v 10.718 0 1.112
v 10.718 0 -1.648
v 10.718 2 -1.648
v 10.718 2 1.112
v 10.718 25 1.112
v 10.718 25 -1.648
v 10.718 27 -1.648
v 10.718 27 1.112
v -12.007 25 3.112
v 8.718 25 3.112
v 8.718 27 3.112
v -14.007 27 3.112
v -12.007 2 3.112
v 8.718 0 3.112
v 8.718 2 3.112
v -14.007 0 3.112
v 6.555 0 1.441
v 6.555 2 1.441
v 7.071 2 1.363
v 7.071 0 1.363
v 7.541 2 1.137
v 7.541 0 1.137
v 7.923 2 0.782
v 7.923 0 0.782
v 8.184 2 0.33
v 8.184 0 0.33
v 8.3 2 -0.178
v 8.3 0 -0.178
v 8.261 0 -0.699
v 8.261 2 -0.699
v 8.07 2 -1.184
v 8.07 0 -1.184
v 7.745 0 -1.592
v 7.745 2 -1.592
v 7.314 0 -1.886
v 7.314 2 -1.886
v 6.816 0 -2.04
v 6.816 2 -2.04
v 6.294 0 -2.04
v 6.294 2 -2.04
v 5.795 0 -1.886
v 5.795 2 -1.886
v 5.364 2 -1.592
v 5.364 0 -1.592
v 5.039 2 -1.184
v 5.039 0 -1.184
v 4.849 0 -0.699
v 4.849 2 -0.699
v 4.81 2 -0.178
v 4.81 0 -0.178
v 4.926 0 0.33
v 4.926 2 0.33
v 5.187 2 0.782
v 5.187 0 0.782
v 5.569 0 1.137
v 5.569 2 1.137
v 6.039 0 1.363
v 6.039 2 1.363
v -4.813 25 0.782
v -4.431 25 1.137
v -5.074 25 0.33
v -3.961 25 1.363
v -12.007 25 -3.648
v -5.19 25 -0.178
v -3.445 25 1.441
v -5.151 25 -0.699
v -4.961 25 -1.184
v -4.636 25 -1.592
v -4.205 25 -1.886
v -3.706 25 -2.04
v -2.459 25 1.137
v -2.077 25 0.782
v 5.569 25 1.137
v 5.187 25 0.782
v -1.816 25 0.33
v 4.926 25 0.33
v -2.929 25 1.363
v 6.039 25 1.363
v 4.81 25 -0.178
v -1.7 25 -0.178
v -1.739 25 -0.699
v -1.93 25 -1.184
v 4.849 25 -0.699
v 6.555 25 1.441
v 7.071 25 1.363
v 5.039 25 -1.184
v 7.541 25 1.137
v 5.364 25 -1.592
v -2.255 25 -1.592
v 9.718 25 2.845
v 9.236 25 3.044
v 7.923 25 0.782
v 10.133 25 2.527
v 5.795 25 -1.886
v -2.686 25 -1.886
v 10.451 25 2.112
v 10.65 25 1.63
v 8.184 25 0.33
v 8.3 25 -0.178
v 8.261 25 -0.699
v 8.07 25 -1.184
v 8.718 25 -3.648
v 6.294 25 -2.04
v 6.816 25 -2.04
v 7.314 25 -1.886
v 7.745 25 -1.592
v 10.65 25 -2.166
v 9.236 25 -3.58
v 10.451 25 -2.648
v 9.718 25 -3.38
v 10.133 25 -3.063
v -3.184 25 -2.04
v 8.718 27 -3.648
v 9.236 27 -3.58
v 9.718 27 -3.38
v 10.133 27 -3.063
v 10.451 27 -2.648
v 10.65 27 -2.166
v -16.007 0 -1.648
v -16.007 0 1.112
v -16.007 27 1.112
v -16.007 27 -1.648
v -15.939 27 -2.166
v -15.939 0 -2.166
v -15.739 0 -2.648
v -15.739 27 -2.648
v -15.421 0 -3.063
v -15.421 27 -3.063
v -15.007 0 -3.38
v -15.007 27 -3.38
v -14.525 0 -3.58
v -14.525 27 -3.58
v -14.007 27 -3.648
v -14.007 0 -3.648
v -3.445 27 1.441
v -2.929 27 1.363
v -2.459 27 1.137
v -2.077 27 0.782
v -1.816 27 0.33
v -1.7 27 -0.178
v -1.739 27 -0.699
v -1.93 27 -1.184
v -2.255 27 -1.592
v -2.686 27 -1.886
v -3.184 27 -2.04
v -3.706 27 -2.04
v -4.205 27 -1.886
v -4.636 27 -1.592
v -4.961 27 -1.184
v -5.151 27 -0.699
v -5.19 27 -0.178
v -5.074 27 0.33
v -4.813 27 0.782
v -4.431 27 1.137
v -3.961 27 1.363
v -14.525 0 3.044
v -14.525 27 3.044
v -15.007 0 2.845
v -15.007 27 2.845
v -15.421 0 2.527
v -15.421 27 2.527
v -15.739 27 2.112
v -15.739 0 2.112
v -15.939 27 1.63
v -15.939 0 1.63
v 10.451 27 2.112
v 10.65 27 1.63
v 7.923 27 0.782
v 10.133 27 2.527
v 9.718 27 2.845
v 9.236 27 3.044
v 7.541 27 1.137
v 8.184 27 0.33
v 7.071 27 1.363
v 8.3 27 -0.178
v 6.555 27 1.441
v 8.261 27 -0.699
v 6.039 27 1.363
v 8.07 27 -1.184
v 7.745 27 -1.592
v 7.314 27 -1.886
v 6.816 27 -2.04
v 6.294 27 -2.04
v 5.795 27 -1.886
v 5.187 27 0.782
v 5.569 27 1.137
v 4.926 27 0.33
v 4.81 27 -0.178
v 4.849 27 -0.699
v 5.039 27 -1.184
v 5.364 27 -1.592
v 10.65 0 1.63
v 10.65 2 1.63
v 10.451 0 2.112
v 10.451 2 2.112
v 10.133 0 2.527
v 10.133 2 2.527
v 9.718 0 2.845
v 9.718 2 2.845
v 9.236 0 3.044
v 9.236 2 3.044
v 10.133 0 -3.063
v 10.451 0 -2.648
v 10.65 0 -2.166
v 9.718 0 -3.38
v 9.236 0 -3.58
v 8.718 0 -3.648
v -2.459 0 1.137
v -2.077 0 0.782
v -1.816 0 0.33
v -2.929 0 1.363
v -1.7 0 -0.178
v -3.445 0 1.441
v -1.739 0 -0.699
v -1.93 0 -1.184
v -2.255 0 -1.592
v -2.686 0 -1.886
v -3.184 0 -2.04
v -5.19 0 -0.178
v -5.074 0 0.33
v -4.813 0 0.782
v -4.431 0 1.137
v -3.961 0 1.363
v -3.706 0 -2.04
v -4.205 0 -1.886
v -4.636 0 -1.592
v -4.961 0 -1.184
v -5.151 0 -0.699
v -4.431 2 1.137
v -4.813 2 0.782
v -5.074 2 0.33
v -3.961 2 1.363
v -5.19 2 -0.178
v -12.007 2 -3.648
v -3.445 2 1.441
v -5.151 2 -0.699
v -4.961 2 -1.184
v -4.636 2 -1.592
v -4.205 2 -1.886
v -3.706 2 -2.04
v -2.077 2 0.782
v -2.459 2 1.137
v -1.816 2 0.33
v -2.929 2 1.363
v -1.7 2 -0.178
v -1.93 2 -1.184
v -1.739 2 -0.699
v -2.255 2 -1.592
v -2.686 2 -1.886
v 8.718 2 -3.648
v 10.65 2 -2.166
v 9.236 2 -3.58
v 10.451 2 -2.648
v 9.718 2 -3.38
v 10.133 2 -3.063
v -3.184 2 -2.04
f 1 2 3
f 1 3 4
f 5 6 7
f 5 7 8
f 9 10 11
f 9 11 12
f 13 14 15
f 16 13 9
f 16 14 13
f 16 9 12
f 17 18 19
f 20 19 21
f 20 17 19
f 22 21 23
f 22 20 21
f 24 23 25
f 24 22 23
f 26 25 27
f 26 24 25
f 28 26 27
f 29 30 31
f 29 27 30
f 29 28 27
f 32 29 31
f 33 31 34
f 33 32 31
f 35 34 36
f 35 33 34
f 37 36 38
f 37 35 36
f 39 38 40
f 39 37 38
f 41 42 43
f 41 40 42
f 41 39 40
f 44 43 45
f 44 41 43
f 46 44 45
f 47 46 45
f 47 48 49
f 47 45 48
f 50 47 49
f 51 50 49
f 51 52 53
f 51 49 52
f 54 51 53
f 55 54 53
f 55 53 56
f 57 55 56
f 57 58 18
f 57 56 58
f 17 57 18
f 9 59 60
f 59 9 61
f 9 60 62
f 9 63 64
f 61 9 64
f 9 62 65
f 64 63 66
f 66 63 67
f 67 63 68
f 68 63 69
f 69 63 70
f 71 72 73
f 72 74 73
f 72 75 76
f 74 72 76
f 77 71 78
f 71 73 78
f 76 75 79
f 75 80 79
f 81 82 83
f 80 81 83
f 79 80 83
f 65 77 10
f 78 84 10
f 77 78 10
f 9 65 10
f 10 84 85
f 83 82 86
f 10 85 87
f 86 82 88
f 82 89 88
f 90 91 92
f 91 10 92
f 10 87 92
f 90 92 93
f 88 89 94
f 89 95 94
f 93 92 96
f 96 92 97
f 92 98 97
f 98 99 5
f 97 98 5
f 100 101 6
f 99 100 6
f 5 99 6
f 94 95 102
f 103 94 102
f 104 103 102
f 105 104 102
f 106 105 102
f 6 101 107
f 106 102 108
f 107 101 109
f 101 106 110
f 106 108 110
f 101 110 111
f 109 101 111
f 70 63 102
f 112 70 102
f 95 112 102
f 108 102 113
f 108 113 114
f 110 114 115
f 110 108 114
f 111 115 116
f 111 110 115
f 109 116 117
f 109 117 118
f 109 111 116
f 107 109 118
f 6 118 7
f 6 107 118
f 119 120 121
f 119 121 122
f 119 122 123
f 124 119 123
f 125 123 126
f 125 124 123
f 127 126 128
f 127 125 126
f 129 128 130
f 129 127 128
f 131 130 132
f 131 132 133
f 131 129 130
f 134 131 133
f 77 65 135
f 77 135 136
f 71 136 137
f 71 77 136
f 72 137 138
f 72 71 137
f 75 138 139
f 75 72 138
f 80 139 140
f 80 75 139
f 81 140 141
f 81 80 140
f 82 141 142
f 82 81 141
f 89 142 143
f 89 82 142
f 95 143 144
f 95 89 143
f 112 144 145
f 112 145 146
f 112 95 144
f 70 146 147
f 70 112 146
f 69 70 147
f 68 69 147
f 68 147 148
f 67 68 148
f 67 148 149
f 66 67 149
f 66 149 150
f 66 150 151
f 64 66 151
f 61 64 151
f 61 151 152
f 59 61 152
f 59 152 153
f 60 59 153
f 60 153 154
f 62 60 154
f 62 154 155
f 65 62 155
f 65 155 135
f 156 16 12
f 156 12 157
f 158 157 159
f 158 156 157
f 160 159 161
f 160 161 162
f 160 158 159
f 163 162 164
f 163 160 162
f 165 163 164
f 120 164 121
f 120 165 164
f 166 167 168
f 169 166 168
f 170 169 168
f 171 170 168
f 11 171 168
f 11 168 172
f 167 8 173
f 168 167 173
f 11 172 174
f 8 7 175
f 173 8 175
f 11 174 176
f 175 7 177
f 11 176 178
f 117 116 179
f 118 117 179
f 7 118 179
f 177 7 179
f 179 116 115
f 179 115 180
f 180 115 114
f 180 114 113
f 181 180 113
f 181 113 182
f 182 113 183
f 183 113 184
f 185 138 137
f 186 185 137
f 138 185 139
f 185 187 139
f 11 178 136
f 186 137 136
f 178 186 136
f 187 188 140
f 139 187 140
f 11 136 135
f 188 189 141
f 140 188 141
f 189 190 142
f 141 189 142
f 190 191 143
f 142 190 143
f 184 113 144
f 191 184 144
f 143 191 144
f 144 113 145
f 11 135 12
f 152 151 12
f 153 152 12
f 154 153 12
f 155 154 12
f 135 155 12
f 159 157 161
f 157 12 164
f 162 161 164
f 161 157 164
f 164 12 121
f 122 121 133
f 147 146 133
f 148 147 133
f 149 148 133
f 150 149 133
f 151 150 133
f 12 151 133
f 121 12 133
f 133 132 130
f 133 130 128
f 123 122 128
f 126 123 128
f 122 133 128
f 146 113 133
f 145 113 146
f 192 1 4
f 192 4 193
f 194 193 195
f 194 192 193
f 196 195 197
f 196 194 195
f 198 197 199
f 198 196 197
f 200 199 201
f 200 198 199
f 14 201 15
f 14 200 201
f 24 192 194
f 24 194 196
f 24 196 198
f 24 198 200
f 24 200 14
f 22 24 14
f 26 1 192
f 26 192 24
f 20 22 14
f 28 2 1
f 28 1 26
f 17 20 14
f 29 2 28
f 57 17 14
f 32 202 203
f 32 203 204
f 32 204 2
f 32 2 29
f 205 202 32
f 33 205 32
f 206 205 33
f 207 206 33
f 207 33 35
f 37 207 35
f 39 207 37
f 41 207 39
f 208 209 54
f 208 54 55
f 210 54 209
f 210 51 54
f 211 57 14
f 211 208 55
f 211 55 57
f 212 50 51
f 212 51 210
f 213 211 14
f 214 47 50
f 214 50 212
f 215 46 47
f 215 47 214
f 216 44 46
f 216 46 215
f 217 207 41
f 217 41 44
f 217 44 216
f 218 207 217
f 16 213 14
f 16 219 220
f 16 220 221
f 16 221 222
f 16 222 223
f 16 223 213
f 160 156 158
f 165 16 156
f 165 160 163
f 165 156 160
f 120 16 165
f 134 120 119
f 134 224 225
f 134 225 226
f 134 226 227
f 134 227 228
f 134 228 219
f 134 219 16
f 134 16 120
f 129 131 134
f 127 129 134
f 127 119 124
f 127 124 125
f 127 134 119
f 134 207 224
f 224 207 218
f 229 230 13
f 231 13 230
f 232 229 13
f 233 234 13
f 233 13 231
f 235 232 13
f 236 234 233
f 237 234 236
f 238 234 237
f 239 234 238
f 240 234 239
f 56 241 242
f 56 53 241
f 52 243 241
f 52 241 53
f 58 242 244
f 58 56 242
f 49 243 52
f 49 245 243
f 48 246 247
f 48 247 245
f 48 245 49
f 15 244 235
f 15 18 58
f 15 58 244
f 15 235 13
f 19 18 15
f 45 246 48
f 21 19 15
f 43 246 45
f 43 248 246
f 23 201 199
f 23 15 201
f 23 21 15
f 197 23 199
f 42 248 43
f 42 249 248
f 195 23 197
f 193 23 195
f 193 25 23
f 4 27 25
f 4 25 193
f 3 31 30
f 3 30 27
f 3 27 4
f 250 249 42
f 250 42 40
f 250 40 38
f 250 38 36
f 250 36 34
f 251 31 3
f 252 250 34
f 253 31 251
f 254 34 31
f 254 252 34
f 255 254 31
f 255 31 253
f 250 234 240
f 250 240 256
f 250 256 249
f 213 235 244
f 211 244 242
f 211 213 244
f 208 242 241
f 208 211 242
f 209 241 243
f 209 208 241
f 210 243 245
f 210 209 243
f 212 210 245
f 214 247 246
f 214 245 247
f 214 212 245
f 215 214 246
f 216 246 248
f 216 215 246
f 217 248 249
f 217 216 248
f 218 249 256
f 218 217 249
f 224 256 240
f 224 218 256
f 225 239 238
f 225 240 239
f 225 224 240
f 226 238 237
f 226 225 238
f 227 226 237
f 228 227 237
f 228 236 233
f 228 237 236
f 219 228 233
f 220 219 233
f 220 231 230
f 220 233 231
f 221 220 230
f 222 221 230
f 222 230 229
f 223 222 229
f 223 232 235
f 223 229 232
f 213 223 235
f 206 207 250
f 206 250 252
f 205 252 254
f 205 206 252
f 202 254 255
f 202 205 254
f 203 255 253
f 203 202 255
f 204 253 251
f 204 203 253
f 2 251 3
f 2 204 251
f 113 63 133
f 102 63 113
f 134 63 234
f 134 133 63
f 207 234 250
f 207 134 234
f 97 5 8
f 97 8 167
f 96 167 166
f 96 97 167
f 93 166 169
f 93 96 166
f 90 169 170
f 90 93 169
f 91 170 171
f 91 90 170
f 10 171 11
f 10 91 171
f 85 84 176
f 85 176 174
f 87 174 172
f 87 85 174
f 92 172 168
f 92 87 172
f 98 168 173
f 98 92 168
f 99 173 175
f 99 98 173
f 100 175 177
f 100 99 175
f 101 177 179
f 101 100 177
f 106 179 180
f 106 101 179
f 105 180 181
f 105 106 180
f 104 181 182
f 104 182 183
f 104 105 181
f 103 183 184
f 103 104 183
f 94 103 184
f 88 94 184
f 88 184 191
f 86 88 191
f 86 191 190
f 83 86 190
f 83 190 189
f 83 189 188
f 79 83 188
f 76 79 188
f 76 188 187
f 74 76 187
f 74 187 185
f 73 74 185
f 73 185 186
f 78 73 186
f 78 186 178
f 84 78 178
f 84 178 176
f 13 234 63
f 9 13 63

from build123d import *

# Parameters (mm, degrees)
SKETCH_1_R               = 1.75
EXTRUDE_1_DEPTH          = 27
CUT_EXTRUDE_1_DEPTH      = 33.108140695
CUT_EXTRUDE_1_DEPTH_BACK = 33.108140695
SKETCH_2_W               = 29.052061839
SKETCH_2_H               = 23


with BuildPart() as part:
    # 草图1 → 凸台-拉伸1 (new body)
    with BuildSketch(Plane(origin=(0, 0, 0), x_dir=(1, 0, 0), z_dir=(0, 1, 0))):
        with BuildLine():
            Line((-14.006965108, 3.648412425), (8.718499779, 3.648412425))
            ThreePointArc((8.718499779, 3.648412425), (10.132713341, 3.062625987), (10.718499779, 1.648412425))
            Line((10.718499779, 1.648412425), (10.718499779, -1.112487436))
            ThreePointArc((10.718499779, -1.112487436), (10.132713341, -2.526700998), (8.718499779, -3.112487436))
            Line((8.718499779, -3.112487436), (-14.006965108, -3.112487436))
            ThreePointArc((-14.006965108, -3.112487436), (-15.421178671, -2.526700998), (-16.006965108, -1.112487436))
            Line((-16.006965108, -1.112487436), (-16.006965108, 1.648412425))
            ThreePointArc((-16.006965108, 1.648412425), (-15.421178671, 3.062625987), (-14.006965108, 3.648412425))
        make_face()
        with Locations(Location((-3.445225135, 0.309187494, 0), (0, 0, 270))):
            Circle(SKETCH_1_R, mode=Mode.SUBTRACT)
        with Locations(Location((6.554774865, 0.309187494, 0), (0, 0, 270))):
            Circle(SKETCH_1_R, mode=Mode.SUBTRACT)
    extrude(amount=EXTRUDE_1_DEPTH)

    # 草图2 → 切除-拉伸1 (cut, two sides: drawn at the far end of the back side and taken through both)
    with BuildSketch(Plane.XY.offset(3.112487436).offset(-CUT_EXTRUDE_1_DEPTH_BACK)):
        with Locations((2.519065811, 13.5)):
            Rectangle(SKETCH_2_W, SKETCH_2_H)
    extrude(amount=CUT_EXTRUDE_1_DEPTH + CUT_EXTRUDE_1_DEPTH_BACK, mode=Mode.SUBTRACT)


solid = part.part
